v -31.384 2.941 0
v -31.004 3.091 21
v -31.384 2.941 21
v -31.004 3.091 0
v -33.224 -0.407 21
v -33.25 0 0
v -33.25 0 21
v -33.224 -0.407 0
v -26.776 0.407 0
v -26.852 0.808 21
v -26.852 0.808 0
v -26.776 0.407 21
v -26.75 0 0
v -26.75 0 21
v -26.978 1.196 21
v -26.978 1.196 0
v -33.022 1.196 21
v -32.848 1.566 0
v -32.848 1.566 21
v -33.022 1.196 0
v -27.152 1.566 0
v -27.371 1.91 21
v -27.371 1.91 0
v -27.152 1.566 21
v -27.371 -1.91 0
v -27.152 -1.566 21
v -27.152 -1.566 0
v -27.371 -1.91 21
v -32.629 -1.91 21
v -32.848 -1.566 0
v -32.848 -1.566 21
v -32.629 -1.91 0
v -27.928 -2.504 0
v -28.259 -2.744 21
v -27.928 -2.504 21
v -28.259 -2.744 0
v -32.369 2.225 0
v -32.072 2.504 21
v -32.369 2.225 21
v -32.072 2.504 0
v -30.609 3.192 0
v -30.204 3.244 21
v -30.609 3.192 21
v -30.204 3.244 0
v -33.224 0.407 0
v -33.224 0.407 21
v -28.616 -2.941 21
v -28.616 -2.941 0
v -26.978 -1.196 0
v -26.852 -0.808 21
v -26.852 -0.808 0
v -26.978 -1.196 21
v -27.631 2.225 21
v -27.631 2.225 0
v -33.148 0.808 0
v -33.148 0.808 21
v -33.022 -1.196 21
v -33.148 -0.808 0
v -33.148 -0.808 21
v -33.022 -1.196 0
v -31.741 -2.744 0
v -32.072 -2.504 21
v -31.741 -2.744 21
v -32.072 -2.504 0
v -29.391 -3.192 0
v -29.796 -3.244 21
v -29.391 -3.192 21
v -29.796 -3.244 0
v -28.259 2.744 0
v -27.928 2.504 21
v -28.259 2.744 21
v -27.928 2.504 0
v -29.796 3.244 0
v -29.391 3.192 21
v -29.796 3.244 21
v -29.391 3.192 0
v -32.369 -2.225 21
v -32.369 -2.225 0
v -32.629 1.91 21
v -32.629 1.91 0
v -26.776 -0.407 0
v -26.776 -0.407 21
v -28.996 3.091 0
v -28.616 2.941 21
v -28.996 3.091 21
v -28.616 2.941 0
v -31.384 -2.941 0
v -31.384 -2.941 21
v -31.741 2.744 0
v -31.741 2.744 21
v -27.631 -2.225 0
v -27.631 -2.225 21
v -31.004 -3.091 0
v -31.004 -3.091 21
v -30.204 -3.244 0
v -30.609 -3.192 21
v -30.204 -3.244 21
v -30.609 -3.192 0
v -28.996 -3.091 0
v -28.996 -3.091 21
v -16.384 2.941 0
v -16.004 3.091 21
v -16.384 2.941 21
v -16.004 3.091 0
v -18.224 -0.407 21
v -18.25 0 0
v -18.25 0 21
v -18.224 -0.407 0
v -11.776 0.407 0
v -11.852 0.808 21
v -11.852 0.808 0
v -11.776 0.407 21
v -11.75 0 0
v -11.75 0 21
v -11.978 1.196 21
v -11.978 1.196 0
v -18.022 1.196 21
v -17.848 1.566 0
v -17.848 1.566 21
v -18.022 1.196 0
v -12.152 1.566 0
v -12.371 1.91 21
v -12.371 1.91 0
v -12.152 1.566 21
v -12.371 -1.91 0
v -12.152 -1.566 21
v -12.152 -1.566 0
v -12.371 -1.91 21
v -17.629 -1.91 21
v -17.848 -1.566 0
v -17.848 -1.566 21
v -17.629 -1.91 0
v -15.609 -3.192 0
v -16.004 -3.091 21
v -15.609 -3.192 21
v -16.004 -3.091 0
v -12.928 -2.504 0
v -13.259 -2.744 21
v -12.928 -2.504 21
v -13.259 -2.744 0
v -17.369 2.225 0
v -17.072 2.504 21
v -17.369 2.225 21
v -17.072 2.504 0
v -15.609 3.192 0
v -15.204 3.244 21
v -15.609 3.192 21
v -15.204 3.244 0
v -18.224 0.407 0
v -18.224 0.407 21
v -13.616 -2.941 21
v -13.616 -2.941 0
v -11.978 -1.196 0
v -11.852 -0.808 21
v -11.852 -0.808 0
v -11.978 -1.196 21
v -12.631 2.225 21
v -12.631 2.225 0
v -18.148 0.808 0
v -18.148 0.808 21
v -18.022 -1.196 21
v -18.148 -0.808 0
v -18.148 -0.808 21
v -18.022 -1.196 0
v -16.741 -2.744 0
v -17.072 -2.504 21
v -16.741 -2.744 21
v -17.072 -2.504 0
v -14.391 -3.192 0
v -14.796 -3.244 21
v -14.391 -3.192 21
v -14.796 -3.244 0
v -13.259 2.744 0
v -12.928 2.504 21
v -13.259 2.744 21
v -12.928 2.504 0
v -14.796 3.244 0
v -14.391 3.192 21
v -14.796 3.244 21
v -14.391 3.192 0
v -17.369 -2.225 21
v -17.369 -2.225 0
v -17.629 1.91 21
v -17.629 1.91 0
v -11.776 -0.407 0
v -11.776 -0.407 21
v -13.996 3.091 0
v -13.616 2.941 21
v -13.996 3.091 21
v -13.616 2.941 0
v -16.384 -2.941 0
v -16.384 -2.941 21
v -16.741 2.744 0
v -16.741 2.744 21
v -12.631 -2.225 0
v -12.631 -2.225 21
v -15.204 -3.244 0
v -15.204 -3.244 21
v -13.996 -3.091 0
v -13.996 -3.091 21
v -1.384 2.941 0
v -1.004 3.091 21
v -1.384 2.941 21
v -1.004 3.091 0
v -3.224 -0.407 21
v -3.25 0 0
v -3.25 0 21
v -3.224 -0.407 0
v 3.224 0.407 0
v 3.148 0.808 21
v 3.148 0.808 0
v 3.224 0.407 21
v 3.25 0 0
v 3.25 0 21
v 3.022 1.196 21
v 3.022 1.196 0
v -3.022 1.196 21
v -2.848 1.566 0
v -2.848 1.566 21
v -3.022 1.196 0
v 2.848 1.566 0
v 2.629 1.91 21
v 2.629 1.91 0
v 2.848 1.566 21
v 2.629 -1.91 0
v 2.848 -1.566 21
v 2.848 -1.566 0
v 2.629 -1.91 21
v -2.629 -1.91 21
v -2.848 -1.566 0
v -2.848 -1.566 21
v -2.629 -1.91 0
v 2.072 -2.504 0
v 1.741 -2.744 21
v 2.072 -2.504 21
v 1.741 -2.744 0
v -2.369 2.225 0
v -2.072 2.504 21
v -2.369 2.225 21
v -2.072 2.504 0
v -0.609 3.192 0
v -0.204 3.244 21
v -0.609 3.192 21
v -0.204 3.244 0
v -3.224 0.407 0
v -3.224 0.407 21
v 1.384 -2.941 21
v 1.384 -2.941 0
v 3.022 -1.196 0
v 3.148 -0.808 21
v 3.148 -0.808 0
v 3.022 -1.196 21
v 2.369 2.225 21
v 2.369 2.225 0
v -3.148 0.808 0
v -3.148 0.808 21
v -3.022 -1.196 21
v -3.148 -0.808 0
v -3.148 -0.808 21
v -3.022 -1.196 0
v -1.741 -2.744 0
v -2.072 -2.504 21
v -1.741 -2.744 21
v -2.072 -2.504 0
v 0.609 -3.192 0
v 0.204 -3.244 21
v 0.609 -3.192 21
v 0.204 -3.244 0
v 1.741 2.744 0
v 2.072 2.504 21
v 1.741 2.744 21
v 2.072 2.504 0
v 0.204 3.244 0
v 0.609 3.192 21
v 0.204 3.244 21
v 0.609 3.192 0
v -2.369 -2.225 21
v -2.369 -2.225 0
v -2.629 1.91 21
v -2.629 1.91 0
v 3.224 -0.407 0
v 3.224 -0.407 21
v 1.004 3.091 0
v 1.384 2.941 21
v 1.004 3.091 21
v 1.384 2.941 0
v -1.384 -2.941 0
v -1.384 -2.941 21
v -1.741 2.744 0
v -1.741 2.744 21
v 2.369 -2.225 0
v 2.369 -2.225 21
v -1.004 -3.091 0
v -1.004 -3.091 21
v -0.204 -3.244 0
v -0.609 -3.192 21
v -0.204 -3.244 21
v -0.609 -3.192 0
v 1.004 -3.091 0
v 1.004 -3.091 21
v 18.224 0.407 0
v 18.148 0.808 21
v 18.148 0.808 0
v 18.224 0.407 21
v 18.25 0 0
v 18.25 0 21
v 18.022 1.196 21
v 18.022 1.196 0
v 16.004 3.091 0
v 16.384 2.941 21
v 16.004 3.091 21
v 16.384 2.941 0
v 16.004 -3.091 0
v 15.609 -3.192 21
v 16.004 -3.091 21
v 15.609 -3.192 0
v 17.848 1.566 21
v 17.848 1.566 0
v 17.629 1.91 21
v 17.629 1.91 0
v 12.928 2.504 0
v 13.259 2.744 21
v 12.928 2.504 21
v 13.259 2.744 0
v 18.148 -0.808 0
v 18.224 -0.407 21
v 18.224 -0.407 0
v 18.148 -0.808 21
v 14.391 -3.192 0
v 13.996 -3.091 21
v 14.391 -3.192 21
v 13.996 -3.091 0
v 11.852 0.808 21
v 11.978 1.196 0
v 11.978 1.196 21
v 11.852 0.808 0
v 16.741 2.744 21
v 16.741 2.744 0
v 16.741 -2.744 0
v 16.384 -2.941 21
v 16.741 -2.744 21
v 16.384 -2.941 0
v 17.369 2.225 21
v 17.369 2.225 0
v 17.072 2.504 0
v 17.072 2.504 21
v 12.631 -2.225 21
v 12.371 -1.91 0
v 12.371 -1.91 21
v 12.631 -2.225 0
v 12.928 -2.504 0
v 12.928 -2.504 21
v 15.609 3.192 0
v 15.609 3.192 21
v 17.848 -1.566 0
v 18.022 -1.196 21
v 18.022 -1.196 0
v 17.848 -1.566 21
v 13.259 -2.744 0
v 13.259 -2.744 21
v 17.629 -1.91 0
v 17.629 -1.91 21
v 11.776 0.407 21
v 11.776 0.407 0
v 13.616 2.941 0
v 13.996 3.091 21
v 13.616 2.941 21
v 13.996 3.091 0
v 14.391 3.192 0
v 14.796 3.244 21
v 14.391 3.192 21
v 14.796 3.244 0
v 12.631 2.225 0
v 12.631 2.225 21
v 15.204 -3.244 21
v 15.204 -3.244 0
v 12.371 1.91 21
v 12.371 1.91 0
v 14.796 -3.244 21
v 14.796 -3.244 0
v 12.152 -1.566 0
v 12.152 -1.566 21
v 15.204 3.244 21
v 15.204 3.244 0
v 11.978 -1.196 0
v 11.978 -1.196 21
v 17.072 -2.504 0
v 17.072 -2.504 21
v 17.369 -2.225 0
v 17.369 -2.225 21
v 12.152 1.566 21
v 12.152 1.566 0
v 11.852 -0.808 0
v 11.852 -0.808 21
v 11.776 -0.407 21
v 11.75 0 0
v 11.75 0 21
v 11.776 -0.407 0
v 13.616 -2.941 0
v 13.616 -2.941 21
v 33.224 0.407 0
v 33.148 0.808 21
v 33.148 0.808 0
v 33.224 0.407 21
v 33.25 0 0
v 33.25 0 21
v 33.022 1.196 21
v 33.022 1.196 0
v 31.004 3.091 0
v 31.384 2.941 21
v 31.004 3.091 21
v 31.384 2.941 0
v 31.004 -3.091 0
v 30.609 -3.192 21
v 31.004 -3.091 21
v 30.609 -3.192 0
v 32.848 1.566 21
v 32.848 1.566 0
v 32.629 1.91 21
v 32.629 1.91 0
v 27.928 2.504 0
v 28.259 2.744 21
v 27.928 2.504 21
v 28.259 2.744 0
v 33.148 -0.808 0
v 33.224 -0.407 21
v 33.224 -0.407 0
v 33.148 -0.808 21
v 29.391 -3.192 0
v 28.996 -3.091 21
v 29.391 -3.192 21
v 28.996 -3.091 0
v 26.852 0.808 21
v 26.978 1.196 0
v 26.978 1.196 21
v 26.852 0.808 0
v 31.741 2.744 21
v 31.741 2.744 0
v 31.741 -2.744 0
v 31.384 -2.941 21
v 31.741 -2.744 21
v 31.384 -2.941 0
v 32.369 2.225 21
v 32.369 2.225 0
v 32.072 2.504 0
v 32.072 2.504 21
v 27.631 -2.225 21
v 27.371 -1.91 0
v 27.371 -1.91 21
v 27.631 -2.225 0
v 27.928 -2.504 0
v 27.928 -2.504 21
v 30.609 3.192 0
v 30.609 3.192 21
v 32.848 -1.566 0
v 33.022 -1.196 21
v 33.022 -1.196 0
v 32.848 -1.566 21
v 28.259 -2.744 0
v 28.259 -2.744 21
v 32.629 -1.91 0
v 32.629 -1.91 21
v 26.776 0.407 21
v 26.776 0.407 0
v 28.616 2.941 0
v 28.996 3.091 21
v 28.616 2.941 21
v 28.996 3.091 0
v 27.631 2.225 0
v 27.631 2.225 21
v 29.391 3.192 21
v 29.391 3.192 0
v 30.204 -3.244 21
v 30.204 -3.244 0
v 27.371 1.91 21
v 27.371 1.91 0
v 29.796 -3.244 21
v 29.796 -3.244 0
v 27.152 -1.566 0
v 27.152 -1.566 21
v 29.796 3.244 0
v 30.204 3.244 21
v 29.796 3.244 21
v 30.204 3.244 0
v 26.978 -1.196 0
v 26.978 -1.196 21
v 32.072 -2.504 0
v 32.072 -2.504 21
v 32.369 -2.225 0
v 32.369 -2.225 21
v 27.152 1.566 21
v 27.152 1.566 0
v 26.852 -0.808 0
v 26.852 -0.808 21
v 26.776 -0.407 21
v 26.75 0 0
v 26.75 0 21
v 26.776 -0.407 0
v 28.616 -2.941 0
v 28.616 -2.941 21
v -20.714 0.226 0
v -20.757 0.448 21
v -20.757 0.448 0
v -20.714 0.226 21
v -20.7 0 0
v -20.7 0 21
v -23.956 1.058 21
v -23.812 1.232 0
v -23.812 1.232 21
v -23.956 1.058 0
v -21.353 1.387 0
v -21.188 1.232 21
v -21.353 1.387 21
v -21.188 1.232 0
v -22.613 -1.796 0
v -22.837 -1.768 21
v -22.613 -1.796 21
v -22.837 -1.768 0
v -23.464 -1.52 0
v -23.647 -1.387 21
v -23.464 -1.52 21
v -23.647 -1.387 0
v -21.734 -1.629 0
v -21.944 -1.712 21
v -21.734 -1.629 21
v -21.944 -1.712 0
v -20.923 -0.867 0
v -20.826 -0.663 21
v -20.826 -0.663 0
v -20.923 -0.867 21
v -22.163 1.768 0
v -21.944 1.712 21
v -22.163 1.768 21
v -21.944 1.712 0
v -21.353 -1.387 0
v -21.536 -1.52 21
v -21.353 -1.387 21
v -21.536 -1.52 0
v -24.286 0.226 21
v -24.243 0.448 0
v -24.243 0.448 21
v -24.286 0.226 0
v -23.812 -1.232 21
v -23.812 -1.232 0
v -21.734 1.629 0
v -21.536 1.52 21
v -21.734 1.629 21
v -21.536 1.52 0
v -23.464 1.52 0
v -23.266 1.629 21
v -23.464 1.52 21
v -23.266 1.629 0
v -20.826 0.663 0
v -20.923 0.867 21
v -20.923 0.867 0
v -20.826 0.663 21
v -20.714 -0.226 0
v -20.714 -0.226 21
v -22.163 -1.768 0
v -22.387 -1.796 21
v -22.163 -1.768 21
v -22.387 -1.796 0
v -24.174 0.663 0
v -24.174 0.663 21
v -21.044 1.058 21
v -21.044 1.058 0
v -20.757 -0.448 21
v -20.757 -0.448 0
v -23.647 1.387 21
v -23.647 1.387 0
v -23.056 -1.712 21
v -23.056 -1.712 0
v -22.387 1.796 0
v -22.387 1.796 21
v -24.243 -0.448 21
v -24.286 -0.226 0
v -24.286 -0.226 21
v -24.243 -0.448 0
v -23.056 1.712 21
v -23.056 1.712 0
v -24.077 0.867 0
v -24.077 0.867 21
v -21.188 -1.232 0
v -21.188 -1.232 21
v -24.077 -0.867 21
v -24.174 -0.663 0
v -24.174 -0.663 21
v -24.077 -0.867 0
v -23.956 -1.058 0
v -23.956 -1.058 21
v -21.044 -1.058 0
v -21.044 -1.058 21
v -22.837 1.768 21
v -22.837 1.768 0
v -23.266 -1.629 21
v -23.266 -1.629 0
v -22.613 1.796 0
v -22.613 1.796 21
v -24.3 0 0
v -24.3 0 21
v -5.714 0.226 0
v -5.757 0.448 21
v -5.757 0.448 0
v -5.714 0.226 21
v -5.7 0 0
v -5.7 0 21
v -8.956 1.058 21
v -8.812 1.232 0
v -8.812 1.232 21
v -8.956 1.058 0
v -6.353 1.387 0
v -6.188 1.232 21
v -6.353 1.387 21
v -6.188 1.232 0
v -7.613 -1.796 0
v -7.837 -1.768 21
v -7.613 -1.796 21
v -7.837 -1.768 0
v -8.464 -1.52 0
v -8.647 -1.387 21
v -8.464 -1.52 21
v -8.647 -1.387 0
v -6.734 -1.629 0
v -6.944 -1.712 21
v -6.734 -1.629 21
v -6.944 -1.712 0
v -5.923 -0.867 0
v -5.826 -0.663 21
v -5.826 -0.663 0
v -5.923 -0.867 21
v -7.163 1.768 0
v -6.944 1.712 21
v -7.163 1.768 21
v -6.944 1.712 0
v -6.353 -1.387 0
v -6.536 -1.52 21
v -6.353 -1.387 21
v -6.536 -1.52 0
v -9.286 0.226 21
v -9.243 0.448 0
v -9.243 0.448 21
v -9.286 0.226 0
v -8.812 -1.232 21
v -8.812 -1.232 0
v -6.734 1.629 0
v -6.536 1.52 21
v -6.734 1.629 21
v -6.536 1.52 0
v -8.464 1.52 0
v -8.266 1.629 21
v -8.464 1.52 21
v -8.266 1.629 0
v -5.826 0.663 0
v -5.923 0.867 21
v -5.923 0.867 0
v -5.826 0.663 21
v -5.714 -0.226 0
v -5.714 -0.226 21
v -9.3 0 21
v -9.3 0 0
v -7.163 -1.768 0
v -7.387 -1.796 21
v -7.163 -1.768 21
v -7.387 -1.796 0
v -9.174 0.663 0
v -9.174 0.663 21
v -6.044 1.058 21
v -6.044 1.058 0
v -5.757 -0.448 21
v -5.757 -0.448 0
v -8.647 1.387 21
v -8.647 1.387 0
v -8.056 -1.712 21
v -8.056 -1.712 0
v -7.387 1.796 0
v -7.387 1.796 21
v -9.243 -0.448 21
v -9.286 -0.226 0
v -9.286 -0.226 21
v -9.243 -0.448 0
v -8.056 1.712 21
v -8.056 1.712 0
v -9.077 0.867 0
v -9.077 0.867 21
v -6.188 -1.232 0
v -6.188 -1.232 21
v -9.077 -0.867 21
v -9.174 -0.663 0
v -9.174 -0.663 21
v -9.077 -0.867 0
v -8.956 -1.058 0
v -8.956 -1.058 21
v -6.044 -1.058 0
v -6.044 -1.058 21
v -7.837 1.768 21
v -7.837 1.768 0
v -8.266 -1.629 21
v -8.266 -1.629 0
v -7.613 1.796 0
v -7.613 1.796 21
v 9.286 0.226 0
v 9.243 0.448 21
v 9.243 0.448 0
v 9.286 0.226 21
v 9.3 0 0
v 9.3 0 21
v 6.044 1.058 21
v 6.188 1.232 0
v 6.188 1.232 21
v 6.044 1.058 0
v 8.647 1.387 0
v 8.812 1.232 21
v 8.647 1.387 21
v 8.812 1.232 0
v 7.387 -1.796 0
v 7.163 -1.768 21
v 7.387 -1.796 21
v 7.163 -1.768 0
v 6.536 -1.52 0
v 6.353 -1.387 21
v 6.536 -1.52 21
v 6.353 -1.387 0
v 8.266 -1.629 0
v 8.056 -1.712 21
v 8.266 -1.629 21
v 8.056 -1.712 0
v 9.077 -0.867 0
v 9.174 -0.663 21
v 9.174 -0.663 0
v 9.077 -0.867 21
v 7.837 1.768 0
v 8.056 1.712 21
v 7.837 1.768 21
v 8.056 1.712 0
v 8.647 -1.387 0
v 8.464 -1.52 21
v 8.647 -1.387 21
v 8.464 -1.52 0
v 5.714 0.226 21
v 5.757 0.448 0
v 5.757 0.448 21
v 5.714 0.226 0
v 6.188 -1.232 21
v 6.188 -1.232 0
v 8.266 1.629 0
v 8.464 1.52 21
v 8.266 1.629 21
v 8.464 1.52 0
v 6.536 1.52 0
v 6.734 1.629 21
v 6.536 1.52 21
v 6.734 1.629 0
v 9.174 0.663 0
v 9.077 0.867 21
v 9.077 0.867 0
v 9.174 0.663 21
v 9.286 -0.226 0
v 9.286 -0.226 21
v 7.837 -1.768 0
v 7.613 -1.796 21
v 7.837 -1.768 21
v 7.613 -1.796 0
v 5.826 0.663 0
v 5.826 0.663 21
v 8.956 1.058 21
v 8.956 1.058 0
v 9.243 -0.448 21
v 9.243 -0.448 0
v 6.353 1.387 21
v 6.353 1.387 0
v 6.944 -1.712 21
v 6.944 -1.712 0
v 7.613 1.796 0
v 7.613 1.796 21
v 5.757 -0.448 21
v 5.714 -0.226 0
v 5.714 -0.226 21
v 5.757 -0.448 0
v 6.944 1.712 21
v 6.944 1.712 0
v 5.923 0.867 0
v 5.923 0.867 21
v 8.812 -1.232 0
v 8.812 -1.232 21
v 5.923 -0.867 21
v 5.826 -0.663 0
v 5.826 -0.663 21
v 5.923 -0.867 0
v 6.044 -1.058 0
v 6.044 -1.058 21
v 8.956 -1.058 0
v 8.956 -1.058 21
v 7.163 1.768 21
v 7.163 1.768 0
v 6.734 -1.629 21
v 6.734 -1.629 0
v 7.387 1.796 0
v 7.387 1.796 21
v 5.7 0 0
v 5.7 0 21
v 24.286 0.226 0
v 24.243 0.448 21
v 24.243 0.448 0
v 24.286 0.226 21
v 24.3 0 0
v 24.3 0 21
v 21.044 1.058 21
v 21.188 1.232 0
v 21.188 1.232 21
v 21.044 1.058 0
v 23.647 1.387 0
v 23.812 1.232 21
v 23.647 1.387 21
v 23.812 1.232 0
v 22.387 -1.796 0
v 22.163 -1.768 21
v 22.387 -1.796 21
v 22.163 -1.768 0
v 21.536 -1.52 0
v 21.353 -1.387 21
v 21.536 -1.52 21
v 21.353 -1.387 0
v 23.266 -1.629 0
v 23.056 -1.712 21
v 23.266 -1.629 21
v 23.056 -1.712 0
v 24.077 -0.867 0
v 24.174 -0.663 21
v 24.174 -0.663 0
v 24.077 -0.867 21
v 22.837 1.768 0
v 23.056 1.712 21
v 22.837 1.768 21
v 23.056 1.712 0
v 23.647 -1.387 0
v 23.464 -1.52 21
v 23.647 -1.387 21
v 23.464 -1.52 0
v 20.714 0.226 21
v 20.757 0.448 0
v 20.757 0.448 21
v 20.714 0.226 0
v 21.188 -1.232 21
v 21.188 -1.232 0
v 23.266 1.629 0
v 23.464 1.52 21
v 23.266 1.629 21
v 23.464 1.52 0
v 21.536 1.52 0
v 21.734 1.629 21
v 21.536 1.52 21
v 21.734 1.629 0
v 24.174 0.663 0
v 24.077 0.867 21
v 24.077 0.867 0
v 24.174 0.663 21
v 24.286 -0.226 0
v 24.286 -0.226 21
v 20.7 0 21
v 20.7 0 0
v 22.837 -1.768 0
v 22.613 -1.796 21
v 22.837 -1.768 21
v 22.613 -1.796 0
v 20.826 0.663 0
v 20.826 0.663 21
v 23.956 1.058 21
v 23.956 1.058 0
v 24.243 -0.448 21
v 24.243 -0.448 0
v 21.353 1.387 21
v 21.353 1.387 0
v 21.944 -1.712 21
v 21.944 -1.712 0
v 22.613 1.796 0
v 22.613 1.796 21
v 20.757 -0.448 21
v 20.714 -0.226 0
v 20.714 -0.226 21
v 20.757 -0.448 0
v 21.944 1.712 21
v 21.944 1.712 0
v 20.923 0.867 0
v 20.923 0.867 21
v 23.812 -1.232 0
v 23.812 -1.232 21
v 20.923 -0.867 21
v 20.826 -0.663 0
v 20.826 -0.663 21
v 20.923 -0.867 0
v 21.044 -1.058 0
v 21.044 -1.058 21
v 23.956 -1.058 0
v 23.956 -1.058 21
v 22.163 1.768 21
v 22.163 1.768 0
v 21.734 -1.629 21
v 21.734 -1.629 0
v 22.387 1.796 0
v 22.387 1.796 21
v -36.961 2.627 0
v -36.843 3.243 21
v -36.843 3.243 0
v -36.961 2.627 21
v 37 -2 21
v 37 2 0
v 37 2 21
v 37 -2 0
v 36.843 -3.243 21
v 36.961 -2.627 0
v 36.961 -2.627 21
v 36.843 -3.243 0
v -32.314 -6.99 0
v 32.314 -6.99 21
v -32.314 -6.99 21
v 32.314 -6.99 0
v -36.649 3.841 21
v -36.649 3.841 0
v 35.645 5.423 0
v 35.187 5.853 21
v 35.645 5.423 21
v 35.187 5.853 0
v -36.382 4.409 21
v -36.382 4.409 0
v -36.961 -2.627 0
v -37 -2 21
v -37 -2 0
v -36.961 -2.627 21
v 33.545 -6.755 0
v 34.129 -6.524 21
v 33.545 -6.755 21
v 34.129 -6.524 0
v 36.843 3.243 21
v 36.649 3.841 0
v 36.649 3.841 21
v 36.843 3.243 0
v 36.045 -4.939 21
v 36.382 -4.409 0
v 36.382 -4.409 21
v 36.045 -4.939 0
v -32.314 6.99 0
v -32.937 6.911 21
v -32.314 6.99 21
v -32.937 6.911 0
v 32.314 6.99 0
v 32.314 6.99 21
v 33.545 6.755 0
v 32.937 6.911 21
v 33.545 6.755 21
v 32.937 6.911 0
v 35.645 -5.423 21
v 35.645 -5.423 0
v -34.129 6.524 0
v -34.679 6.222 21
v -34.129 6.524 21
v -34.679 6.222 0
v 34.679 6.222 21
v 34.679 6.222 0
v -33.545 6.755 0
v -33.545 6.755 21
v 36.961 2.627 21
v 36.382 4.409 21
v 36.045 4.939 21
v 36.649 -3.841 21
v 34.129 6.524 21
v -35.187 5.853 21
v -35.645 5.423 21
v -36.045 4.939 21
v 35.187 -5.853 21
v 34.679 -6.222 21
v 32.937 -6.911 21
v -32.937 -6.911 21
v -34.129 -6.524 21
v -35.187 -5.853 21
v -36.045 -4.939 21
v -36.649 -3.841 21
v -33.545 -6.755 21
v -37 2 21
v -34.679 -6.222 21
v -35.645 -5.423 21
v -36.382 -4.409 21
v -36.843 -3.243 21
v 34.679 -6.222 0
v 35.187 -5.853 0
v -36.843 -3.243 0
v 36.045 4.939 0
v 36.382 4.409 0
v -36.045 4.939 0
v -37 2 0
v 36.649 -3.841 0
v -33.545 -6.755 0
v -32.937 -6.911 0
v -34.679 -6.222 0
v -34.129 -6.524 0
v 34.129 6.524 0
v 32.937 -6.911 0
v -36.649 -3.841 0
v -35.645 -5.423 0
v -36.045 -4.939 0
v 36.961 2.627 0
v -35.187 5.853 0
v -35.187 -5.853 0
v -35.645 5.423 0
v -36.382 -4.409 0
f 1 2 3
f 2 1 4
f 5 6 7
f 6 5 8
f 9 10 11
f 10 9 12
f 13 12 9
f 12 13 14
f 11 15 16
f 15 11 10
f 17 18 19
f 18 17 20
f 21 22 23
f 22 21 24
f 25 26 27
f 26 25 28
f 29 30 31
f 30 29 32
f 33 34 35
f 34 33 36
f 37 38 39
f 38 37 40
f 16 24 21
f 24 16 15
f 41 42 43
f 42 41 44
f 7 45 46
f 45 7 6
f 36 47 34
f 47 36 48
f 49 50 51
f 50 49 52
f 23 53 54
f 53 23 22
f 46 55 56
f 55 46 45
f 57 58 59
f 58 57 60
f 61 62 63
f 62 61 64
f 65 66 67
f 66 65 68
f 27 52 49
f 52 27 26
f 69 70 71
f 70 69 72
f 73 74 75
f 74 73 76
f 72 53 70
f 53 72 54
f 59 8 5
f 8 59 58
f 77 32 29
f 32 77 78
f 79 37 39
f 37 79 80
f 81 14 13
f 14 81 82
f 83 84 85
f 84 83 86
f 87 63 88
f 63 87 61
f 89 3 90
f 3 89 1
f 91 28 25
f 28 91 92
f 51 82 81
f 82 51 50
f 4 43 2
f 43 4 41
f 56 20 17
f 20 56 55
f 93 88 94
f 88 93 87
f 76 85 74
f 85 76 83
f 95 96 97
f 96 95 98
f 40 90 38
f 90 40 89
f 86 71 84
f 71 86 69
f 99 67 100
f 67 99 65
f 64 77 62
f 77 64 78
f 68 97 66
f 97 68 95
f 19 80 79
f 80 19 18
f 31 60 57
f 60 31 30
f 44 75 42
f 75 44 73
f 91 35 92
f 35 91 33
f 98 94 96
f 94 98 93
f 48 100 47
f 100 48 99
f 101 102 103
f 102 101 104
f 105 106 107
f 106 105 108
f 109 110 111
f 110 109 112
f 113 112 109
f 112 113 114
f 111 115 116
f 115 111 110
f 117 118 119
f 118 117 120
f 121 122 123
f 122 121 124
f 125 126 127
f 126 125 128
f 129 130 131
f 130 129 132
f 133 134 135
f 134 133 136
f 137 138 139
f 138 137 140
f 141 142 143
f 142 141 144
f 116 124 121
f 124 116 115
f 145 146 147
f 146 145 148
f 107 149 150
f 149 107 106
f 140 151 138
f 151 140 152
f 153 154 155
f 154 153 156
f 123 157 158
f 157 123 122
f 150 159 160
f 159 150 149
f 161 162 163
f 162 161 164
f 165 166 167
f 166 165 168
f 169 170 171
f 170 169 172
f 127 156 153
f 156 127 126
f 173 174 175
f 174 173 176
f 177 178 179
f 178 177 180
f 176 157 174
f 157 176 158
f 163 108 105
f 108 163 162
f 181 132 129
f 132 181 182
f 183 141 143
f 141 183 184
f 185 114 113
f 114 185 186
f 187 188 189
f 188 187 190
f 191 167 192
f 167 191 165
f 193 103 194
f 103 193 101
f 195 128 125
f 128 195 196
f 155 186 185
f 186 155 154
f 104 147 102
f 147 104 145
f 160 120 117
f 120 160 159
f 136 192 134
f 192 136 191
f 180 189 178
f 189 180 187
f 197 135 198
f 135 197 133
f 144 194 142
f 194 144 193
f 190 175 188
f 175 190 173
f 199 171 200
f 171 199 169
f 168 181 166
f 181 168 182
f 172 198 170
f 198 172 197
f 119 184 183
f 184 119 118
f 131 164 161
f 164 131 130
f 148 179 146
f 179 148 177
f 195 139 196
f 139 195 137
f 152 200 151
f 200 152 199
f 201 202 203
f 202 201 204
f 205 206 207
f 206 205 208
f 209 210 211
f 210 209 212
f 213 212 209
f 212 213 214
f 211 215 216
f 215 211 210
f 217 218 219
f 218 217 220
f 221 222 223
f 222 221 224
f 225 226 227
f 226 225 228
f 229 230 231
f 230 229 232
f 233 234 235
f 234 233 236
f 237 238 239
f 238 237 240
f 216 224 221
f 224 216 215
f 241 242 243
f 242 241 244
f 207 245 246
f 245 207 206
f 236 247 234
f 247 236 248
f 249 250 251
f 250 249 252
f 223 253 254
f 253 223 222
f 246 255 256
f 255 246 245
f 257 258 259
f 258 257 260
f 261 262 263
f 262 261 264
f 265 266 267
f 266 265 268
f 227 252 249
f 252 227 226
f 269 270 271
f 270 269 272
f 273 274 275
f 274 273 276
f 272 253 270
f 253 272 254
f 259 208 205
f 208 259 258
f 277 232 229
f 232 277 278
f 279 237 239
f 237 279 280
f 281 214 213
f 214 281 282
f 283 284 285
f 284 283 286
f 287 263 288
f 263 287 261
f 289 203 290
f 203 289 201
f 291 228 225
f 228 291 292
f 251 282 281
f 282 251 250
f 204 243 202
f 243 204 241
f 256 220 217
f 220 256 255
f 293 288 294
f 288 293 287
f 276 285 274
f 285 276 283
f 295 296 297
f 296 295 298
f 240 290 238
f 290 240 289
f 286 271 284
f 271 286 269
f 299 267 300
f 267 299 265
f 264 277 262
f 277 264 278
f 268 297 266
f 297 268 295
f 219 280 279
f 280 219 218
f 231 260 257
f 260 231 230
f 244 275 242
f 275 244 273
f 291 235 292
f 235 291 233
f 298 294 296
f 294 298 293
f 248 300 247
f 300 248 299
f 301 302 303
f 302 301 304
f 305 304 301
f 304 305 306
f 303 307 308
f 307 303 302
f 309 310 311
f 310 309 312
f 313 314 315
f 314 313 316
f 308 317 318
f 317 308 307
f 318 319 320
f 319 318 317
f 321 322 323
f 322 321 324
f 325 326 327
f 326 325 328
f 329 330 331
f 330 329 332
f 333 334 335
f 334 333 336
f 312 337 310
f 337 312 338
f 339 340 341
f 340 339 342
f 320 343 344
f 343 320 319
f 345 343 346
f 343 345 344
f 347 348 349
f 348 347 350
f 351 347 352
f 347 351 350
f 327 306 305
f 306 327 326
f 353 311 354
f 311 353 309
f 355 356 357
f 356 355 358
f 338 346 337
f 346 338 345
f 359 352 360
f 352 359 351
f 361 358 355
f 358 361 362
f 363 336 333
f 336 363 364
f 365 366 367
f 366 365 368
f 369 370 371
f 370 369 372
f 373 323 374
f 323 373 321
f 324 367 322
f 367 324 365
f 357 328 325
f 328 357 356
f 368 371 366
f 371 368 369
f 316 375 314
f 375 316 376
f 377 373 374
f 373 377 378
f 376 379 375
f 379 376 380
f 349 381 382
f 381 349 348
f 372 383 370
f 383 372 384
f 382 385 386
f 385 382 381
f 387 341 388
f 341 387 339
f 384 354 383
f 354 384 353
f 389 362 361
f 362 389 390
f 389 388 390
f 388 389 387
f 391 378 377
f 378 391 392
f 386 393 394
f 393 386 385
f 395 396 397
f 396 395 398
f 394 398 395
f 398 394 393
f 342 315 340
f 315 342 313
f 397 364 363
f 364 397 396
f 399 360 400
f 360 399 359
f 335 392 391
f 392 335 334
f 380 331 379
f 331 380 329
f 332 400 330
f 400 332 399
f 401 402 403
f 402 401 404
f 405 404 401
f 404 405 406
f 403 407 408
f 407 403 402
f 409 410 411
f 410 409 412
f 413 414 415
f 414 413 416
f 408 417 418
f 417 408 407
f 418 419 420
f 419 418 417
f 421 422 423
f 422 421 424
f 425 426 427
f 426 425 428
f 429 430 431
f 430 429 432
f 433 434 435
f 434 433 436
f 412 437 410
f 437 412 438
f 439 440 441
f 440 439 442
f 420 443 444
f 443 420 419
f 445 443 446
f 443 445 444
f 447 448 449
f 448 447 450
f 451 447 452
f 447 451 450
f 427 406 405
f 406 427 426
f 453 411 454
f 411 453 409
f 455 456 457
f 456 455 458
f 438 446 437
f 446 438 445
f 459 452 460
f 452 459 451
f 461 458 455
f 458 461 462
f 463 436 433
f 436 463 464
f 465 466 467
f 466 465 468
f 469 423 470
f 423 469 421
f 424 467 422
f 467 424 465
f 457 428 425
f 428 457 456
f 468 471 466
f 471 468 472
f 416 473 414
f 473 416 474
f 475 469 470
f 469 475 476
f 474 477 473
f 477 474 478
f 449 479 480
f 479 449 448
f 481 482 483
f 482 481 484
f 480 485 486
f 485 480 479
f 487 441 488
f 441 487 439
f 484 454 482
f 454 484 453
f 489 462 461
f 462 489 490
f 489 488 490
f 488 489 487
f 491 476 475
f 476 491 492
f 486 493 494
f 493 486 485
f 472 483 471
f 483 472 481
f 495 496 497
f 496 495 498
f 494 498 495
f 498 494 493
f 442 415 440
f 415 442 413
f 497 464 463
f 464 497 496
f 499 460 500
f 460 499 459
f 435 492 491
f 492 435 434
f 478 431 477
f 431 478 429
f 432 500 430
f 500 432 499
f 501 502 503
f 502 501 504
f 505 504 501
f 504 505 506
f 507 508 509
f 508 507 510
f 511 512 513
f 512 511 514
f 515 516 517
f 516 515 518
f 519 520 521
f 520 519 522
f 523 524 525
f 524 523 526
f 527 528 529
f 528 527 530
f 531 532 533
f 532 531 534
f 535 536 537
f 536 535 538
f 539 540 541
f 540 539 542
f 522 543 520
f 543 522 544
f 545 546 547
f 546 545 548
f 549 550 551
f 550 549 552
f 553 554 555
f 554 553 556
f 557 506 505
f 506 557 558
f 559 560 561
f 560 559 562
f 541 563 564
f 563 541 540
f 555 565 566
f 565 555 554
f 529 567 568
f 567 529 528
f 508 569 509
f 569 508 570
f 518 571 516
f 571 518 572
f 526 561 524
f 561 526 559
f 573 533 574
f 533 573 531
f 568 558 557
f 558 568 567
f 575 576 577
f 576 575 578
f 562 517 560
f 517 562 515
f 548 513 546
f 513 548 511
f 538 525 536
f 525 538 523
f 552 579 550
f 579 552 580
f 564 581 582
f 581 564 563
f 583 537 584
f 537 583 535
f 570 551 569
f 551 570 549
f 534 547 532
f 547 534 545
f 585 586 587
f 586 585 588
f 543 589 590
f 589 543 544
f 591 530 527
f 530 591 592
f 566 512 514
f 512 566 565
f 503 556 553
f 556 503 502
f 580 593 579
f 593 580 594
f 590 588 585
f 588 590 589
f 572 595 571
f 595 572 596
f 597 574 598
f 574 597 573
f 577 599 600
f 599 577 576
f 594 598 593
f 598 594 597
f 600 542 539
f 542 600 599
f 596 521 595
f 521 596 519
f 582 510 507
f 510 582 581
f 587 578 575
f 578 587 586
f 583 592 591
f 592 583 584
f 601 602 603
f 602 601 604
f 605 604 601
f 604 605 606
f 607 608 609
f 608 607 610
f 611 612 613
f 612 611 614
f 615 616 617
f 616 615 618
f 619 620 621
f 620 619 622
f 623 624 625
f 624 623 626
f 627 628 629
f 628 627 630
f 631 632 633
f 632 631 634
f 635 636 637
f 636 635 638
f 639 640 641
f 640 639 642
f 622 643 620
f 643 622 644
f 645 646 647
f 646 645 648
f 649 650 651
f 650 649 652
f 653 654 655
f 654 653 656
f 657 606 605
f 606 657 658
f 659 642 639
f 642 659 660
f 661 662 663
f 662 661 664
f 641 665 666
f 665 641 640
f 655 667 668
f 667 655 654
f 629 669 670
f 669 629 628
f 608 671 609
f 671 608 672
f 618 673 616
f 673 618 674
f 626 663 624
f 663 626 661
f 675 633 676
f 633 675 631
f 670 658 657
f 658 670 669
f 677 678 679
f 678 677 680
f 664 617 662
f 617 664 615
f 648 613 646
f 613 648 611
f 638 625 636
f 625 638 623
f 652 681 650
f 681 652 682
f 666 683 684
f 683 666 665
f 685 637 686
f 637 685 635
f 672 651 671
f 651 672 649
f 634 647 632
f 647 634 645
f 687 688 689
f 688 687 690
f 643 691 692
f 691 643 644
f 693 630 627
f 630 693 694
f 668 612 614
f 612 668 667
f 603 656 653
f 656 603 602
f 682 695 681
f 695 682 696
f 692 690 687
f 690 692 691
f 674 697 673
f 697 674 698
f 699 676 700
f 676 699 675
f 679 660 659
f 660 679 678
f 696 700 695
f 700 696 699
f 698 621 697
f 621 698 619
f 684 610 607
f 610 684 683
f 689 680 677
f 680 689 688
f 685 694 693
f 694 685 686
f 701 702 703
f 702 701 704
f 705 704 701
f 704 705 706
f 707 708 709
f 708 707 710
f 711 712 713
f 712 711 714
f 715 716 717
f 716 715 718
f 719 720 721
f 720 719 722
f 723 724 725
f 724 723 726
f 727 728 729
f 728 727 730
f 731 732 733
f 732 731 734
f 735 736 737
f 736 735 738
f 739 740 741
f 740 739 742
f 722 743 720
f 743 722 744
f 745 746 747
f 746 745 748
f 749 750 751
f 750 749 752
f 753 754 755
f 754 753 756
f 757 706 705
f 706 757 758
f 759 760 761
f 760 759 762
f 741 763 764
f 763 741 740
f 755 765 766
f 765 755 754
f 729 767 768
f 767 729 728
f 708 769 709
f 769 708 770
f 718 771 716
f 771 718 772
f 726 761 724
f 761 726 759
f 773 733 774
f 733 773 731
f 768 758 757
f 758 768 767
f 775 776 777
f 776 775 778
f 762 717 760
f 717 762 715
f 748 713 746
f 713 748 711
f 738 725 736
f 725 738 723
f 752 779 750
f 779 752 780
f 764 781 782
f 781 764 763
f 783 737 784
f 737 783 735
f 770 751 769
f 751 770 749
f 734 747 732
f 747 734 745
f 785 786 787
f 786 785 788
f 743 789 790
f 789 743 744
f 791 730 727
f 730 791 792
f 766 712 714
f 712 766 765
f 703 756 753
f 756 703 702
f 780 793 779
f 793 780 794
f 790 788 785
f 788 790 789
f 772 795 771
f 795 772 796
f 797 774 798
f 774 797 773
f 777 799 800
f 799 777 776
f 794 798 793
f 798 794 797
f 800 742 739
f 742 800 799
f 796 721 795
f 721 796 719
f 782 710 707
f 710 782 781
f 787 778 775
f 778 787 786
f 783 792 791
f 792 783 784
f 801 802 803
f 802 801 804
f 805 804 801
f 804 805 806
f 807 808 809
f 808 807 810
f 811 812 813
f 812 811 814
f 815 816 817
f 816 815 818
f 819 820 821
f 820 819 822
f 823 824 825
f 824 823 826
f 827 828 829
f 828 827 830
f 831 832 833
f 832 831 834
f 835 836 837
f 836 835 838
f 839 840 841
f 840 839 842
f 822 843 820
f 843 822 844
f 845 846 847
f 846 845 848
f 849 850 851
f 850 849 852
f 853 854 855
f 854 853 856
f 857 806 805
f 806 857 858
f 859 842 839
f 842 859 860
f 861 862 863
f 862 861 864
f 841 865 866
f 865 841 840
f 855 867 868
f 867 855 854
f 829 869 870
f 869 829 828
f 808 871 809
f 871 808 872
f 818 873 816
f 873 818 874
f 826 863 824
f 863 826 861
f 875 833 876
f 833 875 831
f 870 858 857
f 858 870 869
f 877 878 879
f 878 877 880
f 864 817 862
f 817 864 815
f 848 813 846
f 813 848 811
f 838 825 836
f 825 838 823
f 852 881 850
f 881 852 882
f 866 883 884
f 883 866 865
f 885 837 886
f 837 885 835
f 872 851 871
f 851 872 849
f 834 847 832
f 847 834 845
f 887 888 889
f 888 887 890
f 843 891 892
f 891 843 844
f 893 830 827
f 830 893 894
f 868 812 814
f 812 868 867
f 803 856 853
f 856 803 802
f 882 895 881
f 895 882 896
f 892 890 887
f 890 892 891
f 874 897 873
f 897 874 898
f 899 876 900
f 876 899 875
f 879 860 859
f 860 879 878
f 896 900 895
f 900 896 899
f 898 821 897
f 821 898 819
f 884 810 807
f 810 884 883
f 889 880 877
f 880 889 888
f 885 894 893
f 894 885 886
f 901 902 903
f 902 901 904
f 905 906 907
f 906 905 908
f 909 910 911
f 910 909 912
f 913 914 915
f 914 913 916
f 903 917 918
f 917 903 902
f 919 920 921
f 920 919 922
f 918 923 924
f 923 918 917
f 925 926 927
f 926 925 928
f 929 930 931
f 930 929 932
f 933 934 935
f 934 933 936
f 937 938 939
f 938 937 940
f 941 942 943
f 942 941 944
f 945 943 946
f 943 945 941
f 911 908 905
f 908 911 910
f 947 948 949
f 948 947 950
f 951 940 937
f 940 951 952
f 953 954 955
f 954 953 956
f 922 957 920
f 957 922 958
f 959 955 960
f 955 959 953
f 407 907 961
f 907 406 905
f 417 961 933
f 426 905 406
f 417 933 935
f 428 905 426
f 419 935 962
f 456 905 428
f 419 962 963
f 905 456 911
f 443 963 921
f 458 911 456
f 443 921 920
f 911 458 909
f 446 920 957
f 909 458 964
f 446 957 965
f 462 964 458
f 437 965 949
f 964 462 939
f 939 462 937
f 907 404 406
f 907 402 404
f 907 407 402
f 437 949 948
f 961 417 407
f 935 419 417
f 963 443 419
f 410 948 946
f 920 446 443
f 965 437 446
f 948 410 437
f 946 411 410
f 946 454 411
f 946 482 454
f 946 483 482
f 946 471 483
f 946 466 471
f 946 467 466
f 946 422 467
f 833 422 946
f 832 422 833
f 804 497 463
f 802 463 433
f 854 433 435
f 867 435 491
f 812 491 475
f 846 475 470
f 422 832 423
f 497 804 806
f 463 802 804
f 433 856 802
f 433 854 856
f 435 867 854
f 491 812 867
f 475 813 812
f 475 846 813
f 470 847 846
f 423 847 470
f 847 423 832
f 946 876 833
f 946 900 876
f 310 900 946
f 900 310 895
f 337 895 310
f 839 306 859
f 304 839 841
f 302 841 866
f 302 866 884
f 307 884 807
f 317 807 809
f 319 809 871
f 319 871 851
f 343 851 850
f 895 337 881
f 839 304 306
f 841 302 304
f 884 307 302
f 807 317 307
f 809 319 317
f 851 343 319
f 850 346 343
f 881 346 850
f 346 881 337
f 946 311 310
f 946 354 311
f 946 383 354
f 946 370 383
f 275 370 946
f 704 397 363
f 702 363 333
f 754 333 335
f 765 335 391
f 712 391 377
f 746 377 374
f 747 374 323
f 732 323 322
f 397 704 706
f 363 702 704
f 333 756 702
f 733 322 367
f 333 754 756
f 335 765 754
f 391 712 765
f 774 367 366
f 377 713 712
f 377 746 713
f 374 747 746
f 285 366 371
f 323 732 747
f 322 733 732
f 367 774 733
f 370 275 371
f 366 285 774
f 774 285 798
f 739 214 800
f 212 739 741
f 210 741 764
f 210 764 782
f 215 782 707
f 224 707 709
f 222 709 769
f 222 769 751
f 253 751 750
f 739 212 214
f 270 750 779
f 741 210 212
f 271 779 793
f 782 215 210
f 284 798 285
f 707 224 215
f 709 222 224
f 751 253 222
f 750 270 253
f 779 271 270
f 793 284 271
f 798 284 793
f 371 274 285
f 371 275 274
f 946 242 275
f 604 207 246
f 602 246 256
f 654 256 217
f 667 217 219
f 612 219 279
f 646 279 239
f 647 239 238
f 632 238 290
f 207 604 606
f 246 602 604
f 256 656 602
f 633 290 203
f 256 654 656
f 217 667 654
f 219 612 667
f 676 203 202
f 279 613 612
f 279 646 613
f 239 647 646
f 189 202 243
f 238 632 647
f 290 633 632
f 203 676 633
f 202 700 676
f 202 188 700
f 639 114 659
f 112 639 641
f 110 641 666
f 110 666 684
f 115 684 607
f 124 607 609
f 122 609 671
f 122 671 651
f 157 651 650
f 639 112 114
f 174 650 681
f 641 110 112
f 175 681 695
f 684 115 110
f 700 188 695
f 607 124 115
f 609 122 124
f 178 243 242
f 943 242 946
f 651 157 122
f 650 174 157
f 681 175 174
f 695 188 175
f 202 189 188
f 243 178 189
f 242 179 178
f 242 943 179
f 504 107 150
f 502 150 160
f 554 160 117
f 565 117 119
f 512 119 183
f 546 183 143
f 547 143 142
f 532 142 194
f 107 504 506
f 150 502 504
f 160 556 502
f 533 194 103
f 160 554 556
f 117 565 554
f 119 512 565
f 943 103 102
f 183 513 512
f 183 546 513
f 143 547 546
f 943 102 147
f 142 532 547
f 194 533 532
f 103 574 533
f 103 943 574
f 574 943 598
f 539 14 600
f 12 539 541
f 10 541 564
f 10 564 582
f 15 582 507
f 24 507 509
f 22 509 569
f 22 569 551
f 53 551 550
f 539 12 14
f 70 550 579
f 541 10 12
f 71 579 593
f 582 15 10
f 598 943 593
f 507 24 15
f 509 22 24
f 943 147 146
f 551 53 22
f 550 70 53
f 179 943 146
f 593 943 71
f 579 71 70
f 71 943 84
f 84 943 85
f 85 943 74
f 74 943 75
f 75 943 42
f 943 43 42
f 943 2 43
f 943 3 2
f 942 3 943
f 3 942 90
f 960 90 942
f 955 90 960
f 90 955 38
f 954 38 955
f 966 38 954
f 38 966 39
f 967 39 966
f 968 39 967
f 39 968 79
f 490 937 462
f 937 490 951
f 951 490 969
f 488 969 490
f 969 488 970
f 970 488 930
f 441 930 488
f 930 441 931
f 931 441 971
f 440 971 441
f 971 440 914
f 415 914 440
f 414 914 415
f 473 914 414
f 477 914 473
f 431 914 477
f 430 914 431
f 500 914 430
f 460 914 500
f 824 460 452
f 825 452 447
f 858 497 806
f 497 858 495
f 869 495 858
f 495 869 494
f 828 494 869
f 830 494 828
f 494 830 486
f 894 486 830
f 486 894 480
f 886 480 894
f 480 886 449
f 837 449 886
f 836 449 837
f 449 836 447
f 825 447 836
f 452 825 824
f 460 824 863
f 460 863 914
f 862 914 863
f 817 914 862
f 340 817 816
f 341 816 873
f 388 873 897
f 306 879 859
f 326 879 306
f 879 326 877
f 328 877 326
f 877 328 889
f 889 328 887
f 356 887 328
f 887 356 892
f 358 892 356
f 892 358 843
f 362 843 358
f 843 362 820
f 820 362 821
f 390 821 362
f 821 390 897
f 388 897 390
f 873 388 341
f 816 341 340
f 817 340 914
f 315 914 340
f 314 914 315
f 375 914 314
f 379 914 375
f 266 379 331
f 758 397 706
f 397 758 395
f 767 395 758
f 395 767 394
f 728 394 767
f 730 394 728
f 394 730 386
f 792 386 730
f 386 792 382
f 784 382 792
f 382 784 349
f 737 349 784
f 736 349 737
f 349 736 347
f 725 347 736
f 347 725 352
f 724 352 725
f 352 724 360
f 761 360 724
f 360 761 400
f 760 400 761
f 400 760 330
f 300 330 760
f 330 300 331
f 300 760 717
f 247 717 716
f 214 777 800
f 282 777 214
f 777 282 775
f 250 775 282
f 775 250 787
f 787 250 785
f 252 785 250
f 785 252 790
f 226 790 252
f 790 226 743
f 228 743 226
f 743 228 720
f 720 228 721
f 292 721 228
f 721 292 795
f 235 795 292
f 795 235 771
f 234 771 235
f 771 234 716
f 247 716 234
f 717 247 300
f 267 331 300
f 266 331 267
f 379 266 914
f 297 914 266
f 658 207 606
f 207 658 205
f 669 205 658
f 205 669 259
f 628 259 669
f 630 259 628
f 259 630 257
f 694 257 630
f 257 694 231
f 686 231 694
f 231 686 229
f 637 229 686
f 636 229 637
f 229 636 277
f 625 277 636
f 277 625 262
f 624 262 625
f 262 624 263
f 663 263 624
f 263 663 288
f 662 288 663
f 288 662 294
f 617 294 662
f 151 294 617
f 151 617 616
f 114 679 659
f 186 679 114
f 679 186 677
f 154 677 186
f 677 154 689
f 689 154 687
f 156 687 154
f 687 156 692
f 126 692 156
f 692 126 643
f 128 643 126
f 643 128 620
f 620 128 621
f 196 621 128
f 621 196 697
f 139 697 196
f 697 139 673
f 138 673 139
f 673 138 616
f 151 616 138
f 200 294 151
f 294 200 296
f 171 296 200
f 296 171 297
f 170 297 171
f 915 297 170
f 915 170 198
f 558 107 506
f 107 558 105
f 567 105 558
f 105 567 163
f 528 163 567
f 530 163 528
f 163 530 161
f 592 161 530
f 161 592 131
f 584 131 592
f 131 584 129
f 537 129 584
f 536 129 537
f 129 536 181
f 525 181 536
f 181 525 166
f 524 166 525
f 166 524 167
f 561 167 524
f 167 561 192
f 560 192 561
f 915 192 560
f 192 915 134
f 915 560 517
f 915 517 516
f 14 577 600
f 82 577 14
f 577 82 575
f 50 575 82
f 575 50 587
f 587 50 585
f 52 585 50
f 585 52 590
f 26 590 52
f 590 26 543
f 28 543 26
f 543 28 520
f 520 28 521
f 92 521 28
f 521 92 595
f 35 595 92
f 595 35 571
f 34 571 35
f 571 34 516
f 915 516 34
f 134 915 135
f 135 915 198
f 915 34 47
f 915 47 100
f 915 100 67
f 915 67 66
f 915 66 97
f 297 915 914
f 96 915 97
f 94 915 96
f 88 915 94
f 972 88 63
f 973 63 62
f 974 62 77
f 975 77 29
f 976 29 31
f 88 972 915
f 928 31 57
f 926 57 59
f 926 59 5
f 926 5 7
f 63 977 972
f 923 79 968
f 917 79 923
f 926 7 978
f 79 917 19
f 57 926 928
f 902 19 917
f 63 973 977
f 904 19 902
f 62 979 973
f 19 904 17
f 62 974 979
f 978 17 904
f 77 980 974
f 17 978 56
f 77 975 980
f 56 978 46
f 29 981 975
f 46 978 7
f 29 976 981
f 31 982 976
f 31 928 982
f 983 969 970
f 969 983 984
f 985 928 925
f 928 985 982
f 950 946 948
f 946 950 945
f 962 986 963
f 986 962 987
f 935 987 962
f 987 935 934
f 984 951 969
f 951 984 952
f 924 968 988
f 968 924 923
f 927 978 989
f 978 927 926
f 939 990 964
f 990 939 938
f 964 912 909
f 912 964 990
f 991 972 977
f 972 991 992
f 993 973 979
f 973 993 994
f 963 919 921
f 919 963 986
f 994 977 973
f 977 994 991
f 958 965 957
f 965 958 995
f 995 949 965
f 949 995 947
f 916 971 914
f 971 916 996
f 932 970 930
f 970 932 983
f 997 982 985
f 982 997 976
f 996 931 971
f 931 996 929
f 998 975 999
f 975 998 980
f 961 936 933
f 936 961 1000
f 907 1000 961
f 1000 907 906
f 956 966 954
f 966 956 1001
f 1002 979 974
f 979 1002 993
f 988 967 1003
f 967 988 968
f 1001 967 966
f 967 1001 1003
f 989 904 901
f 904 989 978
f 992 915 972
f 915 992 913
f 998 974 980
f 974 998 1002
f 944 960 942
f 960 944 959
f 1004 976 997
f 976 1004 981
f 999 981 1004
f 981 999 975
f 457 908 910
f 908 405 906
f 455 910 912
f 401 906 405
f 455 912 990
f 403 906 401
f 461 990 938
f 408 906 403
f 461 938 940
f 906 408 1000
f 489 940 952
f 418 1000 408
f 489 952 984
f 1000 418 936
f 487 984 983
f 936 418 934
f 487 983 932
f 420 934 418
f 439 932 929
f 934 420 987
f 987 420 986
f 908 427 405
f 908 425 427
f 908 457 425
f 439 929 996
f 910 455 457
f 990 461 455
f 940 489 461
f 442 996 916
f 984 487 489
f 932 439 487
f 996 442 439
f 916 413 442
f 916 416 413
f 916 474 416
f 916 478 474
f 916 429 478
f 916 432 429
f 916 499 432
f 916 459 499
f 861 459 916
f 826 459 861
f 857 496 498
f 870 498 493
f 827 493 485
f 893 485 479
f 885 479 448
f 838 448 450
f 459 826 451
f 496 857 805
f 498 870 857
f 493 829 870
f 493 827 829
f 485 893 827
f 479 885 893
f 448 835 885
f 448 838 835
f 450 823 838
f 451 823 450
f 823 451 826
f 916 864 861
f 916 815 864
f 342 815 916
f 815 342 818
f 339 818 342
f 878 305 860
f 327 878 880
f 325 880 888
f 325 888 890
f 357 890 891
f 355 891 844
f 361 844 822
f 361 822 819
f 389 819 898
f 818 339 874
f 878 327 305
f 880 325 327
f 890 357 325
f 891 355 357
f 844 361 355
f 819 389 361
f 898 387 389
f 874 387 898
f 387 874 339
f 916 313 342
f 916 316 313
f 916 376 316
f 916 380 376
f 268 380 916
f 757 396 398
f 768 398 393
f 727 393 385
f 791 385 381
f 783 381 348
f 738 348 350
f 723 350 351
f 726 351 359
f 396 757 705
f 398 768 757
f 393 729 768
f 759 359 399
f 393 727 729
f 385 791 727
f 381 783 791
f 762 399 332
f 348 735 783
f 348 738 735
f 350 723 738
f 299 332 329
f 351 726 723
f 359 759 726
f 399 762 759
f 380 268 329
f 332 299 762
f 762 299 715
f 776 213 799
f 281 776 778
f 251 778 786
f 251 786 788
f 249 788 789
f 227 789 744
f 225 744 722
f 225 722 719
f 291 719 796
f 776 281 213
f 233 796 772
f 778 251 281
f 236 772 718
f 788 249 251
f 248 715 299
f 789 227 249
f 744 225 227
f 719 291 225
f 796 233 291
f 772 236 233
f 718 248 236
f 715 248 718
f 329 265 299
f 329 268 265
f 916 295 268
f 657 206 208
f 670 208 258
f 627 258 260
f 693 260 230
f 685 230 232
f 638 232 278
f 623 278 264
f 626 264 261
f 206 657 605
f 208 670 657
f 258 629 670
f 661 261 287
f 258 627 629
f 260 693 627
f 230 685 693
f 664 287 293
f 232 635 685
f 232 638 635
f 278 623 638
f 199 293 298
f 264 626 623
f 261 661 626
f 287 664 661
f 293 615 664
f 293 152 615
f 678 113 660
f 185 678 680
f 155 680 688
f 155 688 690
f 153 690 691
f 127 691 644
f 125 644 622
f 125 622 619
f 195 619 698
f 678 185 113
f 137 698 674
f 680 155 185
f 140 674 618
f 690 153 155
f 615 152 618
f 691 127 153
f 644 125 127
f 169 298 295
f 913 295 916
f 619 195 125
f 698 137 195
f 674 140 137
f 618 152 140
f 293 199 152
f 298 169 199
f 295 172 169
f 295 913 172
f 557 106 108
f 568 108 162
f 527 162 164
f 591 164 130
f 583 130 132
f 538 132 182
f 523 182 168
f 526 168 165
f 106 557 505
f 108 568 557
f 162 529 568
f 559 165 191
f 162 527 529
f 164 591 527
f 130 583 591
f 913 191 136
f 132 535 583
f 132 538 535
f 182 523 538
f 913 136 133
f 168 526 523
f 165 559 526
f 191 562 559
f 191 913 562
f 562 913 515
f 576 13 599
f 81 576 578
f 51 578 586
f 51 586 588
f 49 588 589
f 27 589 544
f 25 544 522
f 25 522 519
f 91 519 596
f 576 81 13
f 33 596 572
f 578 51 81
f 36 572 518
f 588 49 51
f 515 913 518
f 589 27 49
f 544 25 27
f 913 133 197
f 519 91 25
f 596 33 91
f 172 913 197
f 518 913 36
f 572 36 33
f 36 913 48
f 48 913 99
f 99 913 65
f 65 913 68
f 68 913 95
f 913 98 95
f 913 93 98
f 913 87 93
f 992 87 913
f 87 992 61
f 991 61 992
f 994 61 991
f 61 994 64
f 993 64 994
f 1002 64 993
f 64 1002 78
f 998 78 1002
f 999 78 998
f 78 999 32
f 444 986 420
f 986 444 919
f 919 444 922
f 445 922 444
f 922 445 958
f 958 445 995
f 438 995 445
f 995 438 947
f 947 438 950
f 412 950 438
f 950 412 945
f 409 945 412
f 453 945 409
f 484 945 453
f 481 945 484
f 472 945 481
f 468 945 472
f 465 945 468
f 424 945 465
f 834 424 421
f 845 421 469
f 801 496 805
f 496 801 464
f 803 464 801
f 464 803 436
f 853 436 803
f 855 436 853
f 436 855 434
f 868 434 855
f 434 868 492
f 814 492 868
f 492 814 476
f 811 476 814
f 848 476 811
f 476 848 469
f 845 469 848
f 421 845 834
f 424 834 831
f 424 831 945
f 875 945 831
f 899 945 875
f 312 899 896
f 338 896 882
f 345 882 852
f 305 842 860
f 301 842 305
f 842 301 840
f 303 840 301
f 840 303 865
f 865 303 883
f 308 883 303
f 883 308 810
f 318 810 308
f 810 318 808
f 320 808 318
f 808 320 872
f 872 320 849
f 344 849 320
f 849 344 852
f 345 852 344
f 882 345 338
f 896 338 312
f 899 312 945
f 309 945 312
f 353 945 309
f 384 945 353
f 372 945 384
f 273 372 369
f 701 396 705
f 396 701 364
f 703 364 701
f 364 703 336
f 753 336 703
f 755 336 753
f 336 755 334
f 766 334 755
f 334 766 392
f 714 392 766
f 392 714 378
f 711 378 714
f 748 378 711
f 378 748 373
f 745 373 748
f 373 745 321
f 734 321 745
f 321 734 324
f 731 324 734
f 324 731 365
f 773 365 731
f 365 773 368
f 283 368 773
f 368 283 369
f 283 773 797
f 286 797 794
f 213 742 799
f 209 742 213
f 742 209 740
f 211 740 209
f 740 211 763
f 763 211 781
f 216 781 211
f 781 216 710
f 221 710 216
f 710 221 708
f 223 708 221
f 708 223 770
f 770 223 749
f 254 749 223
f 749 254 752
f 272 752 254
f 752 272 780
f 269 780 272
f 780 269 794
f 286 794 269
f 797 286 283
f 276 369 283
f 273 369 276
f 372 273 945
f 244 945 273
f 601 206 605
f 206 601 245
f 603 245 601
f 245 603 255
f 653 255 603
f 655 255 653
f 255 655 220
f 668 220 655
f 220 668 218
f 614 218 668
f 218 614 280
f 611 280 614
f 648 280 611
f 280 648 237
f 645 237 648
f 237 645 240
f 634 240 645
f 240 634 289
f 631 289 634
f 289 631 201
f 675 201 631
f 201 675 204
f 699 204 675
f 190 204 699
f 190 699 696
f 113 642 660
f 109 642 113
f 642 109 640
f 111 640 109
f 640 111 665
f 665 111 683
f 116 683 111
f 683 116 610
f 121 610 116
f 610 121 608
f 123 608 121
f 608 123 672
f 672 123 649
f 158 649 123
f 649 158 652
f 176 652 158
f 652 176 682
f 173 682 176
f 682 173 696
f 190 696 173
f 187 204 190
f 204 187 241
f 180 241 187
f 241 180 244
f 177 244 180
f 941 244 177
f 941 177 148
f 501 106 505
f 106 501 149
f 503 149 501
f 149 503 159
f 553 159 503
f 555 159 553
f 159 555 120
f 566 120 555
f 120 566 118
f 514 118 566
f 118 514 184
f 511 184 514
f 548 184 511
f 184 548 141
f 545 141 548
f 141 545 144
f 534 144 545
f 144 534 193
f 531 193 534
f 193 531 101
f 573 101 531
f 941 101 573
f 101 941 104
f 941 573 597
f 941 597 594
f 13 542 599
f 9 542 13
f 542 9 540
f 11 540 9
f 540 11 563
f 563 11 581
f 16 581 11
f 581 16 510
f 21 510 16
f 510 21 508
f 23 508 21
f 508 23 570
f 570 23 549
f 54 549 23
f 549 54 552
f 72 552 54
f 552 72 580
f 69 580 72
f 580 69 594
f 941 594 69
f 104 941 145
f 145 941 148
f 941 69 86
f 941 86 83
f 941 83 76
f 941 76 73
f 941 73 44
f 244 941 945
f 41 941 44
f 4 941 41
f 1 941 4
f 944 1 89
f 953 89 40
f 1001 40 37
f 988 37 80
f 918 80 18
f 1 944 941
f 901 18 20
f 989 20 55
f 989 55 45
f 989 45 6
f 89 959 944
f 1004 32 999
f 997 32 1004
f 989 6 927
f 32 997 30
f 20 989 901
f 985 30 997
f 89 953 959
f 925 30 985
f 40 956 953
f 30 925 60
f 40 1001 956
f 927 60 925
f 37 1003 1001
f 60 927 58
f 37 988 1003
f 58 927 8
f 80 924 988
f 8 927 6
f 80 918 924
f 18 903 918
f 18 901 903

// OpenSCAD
$fn = 50;


difference() {
	union() {
		*color(alpha = 1.0000000000, c = "gray") {
			translate(v = [0, 7, 0]) {
				linear_extrude(height = 1) {
					text(font = "Arial:style=Bold", halign = "center", size = 4.5000000000, text = "COMMENT plate main", valign = "center");
				}
			}
		}
		*color(alpha = 1.0000000000, c = "gray") {
			translate(v = [0, 14, 0]) {
				linear_extrude(height = 1) {
					text(font = "Arial:style=Bold", halign = "center", size = 4.5000000000, text = "COMMENT description oobb_plate_shape_p_type_21_depth_5_width_1_height_21_thickness_true_both_holes", valign = "center");
				}
			}
		}
		hull() {
			translate(v = [-32.0000000000, 2.0000000000, 0]) {
				cylinder(h = 21, r = 5);
			}
			translate(v = [32.0000000000, 2.0000000000, 0]) {
				cylinder(h = 21, r = 5);
			}
			translate(v = [-32.0000000000, -2.0000000000, 0]) {
				cylinder(h = 21, r = 5);
			}
			translate(v = [32.0000000000, -2.0000000000, 0]) {
				cylinder(h = 21, r = 5);
			}
		}
	}
	union() {
		*color(alpha = 1.0000000000, c = "gray") {
			translate(v = [0, 7, 0]) {
				linear_extrude(height = 1) {
					text(font = "Arial:style=Bold", halign = "center", size = 4.5000000000, text = "COMMENT holes main", valign = "center");
				}
			}
		}
		*color(alpha = 1.0000000000, c = "gray") {
			translate(v = [0, 14, 0]) {
				linear_extrude(height = 1) {
					text(font = "Arial:style=Bold", halign = "center", size = 4.5000000000, text = "COMMENT description oobb_holes_shape_n_type_5_width_1_height_21_thickness_true_both_holes", valign = "center");
				}
			}
		}
		translate(v = [-30.0000000000, 0.0000000000, 0]) {
			translate(v = [0, 0, -50]) {
				cylinder(h = 100, r = 3.2500000000);
			}
		}
		translate(v = [-15.0000000000, 0.0000000000, 0]) {
			translate(v = [0, 0, -50]) {
				cylinder(h = 100, r = 3.2500000000);
			}
		}
		translate(v = [0, 0, -50]) {
			cylinder(h = 100, r = 3.2500000000);
		}
		translate(v = [15.0000000000, 0.0000000000, 0]) {
			translate(v = [0, 0, -50]) {
				cylinder(h = 100, r = 3.2500000000);
			}
		}
		translate(v = [30.0000000000, 0.0000000000, 0]) {
			translate(v = [0, 0, -50]) {
				cylinder(h = 100, r = 3.2500000000);
			}
		}
		translate(v = [-30.0000000000, 0.0000000000, 0]) {
			translate(v = [0, 0, -50]) {
				cylinder(h = 100, r = 1.8000000000);
			}
		}
		translate(v = [-22.5000000000, 0.0000000000, 0]) {
			translate(v = [0, 0, -50]) {
				cylinder(h = 100, r = 1.8000000000);
			}
		}
		translate(v = [-15.0000000000, 0.0000000000, 0]) {
			translate(v = [0, 0, -50]) {
				cylinder(h = 100, r = 1.8000000000);
			}
		}
		translate(v = [-7.5000000000, 0.0000000000, 0]) {
			translate(v = [0, 0, -50]) {
				cylinder(h = 100, r = 1.8000000000);
			}
		}
		translate(v = [0, 0, -50]) {
			cylinder(h = 100, r = 1.8000000000);
		}
		translate(v = [7.5000000000, 0.0000000000, 0]) {
			translate(v = [0, 0, -50]) {
				cylinder(h = 100, r = 1.8000000000);
			}
		}
		translate(v = [15.0000000000, 0.0000000000, 0]) {
			translate(v = [0, 0, -50]) {
				cylinder(h = 100, r = 1.8000000000);
			}
		}
		translate(v = [22.5000000000, 0.0000000000, 0]) {
			translate(v = [0, 0, -50]) {
				cylinder(h = 100, r = 1.8000000000);
			}
		}
		translate(v = [30.0000000000, 0.0000000000, 0]) {
			translate(v = [0, 0, -50]) {
				cylinder(h = 100, r = 1.8000000000);
			}
		}
	}
}
